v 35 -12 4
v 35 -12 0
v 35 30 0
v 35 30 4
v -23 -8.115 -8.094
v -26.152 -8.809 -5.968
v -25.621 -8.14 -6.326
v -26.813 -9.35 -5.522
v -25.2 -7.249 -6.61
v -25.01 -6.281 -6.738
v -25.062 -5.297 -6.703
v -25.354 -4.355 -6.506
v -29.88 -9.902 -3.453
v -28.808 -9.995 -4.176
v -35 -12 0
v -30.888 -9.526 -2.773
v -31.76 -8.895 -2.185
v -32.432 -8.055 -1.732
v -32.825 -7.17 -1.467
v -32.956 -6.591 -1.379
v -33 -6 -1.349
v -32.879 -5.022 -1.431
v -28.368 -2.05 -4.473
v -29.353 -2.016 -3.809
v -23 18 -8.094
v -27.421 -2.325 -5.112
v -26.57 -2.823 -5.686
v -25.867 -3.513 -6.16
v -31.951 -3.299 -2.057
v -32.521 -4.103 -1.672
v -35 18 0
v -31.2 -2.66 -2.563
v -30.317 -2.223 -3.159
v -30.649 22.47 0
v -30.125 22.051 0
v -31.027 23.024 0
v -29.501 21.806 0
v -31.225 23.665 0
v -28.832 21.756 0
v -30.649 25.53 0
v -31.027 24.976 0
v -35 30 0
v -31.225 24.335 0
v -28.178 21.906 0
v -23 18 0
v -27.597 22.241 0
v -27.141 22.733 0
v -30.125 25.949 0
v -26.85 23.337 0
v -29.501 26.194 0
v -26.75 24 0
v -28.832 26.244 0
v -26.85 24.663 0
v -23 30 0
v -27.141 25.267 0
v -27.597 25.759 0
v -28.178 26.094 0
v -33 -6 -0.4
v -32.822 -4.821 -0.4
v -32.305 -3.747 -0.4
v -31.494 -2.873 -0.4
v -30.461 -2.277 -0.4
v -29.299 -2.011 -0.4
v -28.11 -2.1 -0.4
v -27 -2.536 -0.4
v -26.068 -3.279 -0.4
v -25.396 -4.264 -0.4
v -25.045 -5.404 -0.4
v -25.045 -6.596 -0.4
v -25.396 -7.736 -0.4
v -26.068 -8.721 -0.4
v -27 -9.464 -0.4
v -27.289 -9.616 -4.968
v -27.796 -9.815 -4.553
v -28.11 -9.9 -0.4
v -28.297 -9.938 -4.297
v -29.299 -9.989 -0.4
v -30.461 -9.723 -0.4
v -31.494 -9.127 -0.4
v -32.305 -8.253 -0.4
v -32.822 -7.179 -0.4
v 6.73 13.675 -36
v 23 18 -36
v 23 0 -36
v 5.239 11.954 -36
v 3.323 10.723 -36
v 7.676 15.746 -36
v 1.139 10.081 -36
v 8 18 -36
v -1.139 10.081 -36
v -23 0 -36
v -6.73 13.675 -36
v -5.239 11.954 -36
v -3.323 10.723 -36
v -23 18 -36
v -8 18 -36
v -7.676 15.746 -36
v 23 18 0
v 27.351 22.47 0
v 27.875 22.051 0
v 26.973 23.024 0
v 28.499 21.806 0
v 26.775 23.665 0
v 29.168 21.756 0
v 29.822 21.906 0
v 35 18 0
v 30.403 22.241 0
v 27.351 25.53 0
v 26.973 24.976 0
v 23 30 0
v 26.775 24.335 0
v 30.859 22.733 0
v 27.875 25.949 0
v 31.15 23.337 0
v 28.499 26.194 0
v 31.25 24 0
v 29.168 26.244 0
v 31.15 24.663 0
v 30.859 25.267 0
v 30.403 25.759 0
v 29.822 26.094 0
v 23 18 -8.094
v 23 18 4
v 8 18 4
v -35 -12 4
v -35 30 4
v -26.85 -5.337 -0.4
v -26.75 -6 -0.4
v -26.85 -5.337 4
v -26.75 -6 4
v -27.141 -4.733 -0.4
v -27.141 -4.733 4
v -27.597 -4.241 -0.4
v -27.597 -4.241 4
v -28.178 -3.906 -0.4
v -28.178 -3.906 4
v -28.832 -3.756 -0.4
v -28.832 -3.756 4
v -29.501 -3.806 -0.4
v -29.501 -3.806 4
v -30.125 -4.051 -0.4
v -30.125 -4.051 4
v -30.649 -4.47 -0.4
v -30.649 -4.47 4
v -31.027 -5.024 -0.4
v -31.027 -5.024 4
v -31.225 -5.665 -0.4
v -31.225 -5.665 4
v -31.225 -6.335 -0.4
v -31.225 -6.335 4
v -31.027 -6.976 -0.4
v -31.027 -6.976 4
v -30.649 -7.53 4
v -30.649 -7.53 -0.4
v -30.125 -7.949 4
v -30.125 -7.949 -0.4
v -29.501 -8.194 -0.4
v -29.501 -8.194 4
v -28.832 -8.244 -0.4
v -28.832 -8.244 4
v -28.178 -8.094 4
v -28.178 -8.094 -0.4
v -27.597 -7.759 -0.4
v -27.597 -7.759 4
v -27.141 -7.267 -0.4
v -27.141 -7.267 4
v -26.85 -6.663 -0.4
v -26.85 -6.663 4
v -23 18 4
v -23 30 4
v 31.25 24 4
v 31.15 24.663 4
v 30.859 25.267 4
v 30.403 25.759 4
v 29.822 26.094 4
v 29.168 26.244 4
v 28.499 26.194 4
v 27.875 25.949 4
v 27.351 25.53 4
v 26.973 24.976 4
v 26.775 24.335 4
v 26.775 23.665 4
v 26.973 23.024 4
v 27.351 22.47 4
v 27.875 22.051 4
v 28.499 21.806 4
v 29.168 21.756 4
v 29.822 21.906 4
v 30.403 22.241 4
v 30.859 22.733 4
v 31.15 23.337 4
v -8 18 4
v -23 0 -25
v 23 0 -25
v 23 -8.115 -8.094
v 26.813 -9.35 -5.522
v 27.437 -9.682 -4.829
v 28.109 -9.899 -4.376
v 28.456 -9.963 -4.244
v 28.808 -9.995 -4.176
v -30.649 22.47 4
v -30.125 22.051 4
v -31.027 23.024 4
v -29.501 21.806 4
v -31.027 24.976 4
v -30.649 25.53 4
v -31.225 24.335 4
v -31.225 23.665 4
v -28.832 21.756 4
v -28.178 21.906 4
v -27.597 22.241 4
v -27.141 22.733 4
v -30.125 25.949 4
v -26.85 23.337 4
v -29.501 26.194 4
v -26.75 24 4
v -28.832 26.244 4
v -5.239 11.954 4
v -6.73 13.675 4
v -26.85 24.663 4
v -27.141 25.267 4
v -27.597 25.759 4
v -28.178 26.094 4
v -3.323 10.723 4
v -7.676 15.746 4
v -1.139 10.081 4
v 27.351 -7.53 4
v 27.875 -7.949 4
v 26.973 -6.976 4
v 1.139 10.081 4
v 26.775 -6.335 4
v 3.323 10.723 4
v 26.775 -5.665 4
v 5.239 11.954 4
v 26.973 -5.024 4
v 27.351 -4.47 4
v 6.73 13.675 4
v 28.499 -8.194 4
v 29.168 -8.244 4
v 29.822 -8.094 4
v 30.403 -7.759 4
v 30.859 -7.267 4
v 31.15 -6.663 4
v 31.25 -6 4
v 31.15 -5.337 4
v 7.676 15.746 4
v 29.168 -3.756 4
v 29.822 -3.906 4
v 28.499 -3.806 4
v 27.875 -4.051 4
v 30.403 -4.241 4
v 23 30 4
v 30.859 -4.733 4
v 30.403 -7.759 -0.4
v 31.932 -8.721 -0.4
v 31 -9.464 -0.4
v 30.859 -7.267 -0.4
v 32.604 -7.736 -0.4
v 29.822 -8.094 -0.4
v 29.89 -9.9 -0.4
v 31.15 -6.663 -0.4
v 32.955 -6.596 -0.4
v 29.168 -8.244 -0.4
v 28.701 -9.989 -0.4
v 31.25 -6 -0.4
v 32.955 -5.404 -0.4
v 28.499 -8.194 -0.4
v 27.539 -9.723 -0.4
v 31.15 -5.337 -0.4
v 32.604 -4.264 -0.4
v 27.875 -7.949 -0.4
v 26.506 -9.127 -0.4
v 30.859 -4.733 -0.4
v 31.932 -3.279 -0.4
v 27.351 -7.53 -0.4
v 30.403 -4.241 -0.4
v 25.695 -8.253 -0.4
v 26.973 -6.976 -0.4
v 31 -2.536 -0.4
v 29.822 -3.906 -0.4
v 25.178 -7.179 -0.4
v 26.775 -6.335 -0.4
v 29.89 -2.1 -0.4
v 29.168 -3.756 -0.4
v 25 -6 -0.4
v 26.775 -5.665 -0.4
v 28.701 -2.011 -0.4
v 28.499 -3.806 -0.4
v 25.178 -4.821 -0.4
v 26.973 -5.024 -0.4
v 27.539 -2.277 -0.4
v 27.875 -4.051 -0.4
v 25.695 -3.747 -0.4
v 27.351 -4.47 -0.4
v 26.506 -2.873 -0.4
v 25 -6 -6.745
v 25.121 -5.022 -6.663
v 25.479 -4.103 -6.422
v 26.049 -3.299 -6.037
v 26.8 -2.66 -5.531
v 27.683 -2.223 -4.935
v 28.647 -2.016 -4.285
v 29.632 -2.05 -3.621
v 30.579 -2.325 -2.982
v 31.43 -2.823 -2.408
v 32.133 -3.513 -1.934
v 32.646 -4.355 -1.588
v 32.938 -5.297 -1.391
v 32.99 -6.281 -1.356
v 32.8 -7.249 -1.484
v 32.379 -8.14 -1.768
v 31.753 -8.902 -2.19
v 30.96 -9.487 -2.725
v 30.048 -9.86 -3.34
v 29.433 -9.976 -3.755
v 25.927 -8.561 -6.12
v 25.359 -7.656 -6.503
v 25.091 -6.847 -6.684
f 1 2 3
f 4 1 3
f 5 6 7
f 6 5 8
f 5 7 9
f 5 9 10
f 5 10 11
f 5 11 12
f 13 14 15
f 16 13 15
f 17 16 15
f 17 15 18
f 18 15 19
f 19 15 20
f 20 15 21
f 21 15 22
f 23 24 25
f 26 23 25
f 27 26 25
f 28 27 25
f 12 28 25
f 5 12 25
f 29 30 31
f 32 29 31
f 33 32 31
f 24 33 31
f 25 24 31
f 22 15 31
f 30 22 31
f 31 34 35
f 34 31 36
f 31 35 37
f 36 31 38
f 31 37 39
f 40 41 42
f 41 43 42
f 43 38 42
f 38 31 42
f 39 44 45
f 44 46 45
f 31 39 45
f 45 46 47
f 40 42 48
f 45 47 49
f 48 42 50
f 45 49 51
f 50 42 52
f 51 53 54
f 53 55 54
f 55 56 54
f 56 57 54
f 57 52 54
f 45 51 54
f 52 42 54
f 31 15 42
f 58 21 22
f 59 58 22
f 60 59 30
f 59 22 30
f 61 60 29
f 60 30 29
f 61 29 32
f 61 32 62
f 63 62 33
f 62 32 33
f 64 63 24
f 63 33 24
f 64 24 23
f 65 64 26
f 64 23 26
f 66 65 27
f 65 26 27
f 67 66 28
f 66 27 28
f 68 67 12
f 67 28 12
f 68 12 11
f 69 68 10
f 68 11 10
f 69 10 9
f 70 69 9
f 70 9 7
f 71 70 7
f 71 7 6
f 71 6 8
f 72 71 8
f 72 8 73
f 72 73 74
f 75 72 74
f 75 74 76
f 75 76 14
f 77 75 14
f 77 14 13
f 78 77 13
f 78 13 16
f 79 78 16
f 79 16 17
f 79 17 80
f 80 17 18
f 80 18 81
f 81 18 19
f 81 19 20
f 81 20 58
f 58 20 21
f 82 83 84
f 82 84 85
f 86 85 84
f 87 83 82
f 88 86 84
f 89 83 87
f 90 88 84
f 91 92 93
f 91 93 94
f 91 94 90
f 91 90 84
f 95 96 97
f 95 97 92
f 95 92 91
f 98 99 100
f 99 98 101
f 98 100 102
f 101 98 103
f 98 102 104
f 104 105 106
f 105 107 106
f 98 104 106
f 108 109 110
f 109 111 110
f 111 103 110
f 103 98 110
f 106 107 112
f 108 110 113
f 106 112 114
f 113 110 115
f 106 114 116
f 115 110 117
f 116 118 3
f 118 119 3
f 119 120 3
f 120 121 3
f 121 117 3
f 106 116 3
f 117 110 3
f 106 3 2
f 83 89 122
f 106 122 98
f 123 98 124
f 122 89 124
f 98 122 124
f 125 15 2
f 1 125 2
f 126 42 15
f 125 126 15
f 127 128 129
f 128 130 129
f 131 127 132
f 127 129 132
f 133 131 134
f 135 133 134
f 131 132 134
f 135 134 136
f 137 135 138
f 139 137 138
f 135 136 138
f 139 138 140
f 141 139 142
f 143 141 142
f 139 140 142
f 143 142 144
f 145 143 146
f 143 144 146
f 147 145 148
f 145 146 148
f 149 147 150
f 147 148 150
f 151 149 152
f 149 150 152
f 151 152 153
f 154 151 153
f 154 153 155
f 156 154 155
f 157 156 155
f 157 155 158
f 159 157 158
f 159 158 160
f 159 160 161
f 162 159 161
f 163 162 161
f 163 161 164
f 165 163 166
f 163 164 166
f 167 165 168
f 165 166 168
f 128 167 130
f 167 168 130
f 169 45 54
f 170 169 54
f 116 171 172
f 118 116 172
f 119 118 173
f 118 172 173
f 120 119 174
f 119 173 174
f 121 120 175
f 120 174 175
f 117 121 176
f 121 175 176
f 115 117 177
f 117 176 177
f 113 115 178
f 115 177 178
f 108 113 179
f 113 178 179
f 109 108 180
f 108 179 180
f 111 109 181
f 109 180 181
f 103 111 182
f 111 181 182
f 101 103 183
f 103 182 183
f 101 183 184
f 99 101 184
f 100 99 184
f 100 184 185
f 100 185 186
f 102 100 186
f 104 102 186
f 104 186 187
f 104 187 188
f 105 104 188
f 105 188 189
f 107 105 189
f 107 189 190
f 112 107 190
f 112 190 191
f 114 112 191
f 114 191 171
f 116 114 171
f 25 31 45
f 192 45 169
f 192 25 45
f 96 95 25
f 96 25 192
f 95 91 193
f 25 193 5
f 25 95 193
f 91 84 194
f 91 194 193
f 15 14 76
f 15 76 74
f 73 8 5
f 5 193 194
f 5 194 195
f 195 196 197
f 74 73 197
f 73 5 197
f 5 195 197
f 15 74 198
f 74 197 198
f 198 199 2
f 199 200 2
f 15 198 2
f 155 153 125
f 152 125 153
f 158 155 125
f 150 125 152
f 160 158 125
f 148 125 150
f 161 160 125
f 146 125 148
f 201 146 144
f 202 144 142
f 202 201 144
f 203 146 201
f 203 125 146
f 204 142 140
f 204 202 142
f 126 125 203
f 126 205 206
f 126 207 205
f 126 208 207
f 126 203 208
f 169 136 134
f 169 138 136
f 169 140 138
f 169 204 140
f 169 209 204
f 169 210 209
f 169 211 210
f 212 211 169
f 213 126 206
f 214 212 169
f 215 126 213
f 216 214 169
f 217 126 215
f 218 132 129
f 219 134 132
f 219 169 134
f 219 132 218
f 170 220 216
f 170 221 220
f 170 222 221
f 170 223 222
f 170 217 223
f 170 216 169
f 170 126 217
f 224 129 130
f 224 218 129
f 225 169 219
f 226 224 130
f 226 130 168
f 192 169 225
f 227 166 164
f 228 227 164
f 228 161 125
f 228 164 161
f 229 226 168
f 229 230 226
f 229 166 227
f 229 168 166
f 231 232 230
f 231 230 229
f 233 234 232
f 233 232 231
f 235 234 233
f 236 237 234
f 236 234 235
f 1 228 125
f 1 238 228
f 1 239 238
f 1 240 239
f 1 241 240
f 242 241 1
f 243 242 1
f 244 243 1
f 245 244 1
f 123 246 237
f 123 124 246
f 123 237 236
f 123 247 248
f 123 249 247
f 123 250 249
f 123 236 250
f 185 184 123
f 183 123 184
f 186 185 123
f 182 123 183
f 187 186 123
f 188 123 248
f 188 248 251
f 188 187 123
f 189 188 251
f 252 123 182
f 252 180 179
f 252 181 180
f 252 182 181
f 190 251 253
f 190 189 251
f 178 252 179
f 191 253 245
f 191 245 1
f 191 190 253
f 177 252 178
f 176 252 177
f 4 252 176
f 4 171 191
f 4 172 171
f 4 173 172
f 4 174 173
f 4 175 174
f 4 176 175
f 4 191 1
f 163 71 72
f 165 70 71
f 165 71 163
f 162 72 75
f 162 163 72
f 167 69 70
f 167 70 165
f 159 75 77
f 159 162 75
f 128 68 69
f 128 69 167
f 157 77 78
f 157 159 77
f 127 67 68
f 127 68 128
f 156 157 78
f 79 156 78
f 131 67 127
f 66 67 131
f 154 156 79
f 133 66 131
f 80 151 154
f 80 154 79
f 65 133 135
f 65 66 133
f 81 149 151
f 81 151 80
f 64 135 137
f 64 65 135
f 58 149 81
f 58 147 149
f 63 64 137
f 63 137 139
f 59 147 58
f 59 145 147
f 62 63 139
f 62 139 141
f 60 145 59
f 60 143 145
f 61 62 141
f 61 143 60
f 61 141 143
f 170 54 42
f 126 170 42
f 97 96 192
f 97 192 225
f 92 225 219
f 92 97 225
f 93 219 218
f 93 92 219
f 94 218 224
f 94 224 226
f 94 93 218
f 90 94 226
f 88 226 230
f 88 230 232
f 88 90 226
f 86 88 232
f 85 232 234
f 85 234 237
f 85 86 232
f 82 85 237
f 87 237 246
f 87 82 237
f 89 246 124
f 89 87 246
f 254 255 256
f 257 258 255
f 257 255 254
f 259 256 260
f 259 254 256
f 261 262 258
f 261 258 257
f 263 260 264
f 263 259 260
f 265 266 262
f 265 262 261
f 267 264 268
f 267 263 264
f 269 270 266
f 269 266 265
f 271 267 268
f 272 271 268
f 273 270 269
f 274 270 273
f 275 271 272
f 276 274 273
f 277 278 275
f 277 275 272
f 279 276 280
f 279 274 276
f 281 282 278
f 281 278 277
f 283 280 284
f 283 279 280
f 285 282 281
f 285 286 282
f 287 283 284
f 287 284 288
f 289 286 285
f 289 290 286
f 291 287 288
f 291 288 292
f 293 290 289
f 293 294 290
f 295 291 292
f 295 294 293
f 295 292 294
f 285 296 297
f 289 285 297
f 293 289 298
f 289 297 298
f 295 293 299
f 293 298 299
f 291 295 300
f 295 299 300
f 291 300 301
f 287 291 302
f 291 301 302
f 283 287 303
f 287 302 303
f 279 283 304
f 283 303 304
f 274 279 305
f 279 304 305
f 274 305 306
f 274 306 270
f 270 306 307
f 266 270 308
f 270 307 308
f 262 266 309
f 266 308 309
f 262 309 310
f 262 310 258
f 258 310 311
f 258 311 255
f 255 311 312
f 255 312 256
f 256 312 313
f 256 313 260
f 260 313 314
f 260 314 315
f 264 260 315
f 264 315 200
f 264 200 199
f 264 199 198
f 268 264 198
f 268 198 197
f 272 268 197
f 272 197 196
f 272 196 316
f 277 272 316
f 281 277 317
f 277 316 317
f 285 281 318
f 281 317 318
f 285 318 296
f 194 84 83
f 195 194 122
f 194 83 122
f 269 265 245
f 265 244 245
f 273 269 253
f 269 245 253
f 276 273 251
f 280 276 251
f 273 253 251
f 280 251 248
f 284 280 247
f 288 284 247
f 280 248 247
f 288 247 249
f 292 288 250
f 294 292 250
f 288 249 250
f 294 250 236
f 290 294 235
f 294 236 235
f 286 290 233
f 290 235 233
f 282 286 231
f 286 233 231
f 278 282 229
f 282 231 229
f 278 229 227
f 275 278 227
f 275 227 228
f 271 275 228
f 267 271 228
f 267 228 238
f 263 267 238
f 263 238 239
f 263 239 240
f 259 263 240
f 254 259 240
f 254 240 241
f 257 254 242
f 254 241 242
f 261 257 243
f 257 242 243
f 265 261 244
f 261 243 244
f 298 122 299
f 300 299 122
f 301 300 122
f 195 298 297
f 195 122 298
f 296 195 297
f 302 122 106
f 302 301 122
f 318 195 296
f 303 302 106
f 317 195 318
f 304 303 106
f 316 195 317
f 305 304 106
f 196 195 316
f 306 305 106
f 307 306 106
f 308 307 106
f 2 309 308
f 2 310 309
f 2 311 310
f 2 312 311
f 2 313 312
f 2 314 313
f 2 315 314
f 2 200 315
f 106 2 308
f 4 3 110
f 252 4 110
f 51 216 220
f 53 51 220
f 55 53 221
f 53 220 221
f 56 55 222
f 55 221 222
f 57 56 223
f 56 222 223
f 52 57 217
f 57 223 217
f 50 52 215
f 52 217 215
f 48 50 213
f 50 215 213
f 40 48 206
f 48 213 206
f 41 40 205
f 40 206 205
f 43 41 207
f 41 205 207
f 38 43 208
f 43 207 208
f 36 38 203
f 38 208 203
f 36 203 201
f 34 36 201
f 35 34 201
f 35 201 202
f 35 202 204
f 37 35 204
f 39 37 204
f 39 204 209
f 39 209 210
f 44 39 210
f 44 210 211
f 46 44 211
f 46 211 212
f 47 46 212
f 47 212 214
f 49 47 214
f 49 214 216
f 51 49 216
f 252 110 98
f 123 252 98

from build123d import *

# Parameters (mm, degrees)
ESTRUSIONE_ESTRUSIONE1_DEPTH                         = 4
ESTRUSIONE_ESTRUSIONE2_START                         = -36
ESTRUSIONE_ESTRUSIONE2_DEPTH                         = 36
ESTRUSIONE_ESTRUSIONE3_START                         = -46
ESTRUSIONE_ESTRUSIONE3_DEPTH                         = 46
SMUSSO3_SIZE                                         = 8.0941
SMUSSO3_SIZE2                                        = 11.999996735
SMUSSO2_SIZE                                         = 8.0941
SMUSSO2_SIZE_2                                       = 11.999996735
FORO_LAMATO_PER_VITE_M4_A_TESTA_CILINDRI_D           = 4.5
FORO_LAMATO_PER_VITE_M4_A_TESTA_CILINDRI_DEPTH       = 50
FORO_LAMATO_PER_VITE_M4_A_TESTA_CILINDRI_CBORE_D     = 8
FORO_LAMATO_PER_VITE_M4_A_TESTA_CILINDRI_CBORE_DEPTH = 35.6
FORO_LAMATO_PER_VITE_M4_A_TESTA_CILINDRI_TIP         = 1.351936393
FORO_PER_VITE_M4_1_D                                 = 4.5
FORO_PER_VITE_M4_1_DEPTH                             = 50
FORO_PER_VITE_M4_1_TIP                               = 1.351936393


with BuildPart() as part:
    # Schizzo1 → Estrusione-Estrusione1 (new body)
    with BuildSketch(Plane.XY):
        Polygon((35, 30), (23, 30), (23, 18), (23, 0), (-23, 0), (-23, 18), (-23, 30), (-35, 30), (-35, -12), (35, -12), align=None)
        with BuildLine():
            ThreePointArc((-8, 18), (0, 10), (8, 18))
            Line((8, 18), (23, 18))
            Line((23, 18), (23, 0))
            Line((23, 0), (-23, 0))
            Line((-23, 0), (-23, 18))
            Line((-23, 18), (-8, 18))
        make_face()
    extrude(amount=ESTRUSIONE_ESTRUSIONE1_DEPTH)

    # Schizzo1<3> → Estrusione-Estrusione2 (add)
    with BuildSketch(Plane.XY.offset(ESTRUSIONE_ESTRUSIONE2_START)):
        with BuildLine():
            ThreePointArc((-8, 18), (0, 10), (8, 18))
            Line((8, 18), (23, 18))
            Line((23, 18), (23, 0))
            Line((23, 0), (-23, 0))
            Line((-23, 0), (-23, 18))
            Line((-23, 18), (-8, 18))
        make_face()
    extrude(amount=ESTRUSIONE_ESTRUSIONE2_DEPTH)

    # Schizzo6 → Estrusione-Estrusione3 (add)
    with BuildSketch(Plane(origin=(23, 0, 0), x_dir=(0, 0, -1), z_dir=(1, 0, 0)).offset(ESTRUSIONE_ESTRUSIONE3_START)):
        Polygon((0, 0), (25, 0), (0, -12), align=None)
    extrude(amount=ESTRUSIONE_ESTRUSIONE3_DEPTH)

    # Smusso3
    smusso3_edges = [part.edges().sort_by_distance(p)[0] for p in [
        (-23, 3, 0),
    ]]
    smusso3_side = [part.faces().sort_by_distance(p)[0] for p in [
        (-23, 6.556390977, -16.182957393),
    ]]
    chamfer(smusso3_edges, length=SMUSSO3_SIZE, length2=SMUSSO3_SIZE2, reference=smusso3_side[0])

    # Smusso2
    # the kernel refuses this chamfer: 11.999996735, 8.0941 mm, written as the material it adds along each edge
    with BuildSketch(Plane(origin=(23, -43.002099643, 0), x_dir=(-0.047532142988028575, 0, -0.9988697089125115), z_dir=(0, 1, 0))) as smusso2_piece_1_section:
        Polygon((SMUSSO2_SIZE * 0.998869708913, -SMUSSO2_SIZE * 0.047532142988), (-SMUSSO2_SIZE_2 * 0.047532142989, -SMUSSO2_SIZE_2 * 0.998869708932), (0, 0), align=None)
    smusso2_piece_1 = extrude(amount=61.002099643, mode=Mode.PRIVATE)
    smusso2_piece_1 = split(smusso2_piece_1, bisect_by=Plane(origin=(27.04511503, -8.043833676, -8.242013176), z_dir=(0, 0.9015230574682735, 0.4327310675847713)), keep=Keep.TOP, mode=Mode.PRIVATE)
    add(smusso2_piece_1)

    # Foro lamato per Vite M4 a testa cilindrica piana-1
    with Locations(Plane(origin=(0, 0, -36), x_dir=(-1, 0, 0), z_dir=(0, 0, -1))):
        with Locations((-29, -6), (28.999998368, -6)):
            CounterBoreHole(FORO_LAMATO_PER_VITE_M4_A_TESTA_CILINDRI_D / 2, FORO_LAMATO_PER_VITE_M4_A_TESTA_CILINDRI_CBORE_D / 2, FORO_LAMATO_PER_VITE_M4_A_TESTA_CILINDRI_CBORE_DEPTH, depth=FORO_LAMATO_PER_VITE_M4_A_TESTA_CILINDRI_DEPTH)
            with Locations((0, 0, -(FORO_LAMATO_PER_VITE_M4_A_TESTA_CILINDRI_DEPTH + FORO_LAMATO_PER_VITE_M4_A_TESTA_CILINDRI_TIP / 2))):  # 118° drill point
                Cone(0, FORO_LAMATO_PER_VITE_M4_A_TESTA_CILINDRI_D / 2, FORO_LAMATO_PER_VITE_M4_A_TESTA_CILINDRI_TIP, mode=Mode.SUBTRACT)

    # Foro per Vite M4-1
    with Locations(Plane(origin=(29, 24, 0), x_dir=(-1, 0, 0), z_dir=(0, 0, -1))):
        with Locations((0, 0), (58, 0)):
            Hole(FORO_PER_VITE_M4_1_D / 2, depth=FORO_PER_VITE_M4_1_DEPTH)
            with Locations((0, 0, -(FORO_PER_VITE_M4_1_DEPTH + FORO_PER_VITE_M4_1_TIP / 2))):  # 118° drill point
                Cone(0, FORO_PER_VITE_M4_1_D / 2, FORO_PER_VITE_M4_1_TIP, mode=Mode.SUBTRACT)


solid = part.part
